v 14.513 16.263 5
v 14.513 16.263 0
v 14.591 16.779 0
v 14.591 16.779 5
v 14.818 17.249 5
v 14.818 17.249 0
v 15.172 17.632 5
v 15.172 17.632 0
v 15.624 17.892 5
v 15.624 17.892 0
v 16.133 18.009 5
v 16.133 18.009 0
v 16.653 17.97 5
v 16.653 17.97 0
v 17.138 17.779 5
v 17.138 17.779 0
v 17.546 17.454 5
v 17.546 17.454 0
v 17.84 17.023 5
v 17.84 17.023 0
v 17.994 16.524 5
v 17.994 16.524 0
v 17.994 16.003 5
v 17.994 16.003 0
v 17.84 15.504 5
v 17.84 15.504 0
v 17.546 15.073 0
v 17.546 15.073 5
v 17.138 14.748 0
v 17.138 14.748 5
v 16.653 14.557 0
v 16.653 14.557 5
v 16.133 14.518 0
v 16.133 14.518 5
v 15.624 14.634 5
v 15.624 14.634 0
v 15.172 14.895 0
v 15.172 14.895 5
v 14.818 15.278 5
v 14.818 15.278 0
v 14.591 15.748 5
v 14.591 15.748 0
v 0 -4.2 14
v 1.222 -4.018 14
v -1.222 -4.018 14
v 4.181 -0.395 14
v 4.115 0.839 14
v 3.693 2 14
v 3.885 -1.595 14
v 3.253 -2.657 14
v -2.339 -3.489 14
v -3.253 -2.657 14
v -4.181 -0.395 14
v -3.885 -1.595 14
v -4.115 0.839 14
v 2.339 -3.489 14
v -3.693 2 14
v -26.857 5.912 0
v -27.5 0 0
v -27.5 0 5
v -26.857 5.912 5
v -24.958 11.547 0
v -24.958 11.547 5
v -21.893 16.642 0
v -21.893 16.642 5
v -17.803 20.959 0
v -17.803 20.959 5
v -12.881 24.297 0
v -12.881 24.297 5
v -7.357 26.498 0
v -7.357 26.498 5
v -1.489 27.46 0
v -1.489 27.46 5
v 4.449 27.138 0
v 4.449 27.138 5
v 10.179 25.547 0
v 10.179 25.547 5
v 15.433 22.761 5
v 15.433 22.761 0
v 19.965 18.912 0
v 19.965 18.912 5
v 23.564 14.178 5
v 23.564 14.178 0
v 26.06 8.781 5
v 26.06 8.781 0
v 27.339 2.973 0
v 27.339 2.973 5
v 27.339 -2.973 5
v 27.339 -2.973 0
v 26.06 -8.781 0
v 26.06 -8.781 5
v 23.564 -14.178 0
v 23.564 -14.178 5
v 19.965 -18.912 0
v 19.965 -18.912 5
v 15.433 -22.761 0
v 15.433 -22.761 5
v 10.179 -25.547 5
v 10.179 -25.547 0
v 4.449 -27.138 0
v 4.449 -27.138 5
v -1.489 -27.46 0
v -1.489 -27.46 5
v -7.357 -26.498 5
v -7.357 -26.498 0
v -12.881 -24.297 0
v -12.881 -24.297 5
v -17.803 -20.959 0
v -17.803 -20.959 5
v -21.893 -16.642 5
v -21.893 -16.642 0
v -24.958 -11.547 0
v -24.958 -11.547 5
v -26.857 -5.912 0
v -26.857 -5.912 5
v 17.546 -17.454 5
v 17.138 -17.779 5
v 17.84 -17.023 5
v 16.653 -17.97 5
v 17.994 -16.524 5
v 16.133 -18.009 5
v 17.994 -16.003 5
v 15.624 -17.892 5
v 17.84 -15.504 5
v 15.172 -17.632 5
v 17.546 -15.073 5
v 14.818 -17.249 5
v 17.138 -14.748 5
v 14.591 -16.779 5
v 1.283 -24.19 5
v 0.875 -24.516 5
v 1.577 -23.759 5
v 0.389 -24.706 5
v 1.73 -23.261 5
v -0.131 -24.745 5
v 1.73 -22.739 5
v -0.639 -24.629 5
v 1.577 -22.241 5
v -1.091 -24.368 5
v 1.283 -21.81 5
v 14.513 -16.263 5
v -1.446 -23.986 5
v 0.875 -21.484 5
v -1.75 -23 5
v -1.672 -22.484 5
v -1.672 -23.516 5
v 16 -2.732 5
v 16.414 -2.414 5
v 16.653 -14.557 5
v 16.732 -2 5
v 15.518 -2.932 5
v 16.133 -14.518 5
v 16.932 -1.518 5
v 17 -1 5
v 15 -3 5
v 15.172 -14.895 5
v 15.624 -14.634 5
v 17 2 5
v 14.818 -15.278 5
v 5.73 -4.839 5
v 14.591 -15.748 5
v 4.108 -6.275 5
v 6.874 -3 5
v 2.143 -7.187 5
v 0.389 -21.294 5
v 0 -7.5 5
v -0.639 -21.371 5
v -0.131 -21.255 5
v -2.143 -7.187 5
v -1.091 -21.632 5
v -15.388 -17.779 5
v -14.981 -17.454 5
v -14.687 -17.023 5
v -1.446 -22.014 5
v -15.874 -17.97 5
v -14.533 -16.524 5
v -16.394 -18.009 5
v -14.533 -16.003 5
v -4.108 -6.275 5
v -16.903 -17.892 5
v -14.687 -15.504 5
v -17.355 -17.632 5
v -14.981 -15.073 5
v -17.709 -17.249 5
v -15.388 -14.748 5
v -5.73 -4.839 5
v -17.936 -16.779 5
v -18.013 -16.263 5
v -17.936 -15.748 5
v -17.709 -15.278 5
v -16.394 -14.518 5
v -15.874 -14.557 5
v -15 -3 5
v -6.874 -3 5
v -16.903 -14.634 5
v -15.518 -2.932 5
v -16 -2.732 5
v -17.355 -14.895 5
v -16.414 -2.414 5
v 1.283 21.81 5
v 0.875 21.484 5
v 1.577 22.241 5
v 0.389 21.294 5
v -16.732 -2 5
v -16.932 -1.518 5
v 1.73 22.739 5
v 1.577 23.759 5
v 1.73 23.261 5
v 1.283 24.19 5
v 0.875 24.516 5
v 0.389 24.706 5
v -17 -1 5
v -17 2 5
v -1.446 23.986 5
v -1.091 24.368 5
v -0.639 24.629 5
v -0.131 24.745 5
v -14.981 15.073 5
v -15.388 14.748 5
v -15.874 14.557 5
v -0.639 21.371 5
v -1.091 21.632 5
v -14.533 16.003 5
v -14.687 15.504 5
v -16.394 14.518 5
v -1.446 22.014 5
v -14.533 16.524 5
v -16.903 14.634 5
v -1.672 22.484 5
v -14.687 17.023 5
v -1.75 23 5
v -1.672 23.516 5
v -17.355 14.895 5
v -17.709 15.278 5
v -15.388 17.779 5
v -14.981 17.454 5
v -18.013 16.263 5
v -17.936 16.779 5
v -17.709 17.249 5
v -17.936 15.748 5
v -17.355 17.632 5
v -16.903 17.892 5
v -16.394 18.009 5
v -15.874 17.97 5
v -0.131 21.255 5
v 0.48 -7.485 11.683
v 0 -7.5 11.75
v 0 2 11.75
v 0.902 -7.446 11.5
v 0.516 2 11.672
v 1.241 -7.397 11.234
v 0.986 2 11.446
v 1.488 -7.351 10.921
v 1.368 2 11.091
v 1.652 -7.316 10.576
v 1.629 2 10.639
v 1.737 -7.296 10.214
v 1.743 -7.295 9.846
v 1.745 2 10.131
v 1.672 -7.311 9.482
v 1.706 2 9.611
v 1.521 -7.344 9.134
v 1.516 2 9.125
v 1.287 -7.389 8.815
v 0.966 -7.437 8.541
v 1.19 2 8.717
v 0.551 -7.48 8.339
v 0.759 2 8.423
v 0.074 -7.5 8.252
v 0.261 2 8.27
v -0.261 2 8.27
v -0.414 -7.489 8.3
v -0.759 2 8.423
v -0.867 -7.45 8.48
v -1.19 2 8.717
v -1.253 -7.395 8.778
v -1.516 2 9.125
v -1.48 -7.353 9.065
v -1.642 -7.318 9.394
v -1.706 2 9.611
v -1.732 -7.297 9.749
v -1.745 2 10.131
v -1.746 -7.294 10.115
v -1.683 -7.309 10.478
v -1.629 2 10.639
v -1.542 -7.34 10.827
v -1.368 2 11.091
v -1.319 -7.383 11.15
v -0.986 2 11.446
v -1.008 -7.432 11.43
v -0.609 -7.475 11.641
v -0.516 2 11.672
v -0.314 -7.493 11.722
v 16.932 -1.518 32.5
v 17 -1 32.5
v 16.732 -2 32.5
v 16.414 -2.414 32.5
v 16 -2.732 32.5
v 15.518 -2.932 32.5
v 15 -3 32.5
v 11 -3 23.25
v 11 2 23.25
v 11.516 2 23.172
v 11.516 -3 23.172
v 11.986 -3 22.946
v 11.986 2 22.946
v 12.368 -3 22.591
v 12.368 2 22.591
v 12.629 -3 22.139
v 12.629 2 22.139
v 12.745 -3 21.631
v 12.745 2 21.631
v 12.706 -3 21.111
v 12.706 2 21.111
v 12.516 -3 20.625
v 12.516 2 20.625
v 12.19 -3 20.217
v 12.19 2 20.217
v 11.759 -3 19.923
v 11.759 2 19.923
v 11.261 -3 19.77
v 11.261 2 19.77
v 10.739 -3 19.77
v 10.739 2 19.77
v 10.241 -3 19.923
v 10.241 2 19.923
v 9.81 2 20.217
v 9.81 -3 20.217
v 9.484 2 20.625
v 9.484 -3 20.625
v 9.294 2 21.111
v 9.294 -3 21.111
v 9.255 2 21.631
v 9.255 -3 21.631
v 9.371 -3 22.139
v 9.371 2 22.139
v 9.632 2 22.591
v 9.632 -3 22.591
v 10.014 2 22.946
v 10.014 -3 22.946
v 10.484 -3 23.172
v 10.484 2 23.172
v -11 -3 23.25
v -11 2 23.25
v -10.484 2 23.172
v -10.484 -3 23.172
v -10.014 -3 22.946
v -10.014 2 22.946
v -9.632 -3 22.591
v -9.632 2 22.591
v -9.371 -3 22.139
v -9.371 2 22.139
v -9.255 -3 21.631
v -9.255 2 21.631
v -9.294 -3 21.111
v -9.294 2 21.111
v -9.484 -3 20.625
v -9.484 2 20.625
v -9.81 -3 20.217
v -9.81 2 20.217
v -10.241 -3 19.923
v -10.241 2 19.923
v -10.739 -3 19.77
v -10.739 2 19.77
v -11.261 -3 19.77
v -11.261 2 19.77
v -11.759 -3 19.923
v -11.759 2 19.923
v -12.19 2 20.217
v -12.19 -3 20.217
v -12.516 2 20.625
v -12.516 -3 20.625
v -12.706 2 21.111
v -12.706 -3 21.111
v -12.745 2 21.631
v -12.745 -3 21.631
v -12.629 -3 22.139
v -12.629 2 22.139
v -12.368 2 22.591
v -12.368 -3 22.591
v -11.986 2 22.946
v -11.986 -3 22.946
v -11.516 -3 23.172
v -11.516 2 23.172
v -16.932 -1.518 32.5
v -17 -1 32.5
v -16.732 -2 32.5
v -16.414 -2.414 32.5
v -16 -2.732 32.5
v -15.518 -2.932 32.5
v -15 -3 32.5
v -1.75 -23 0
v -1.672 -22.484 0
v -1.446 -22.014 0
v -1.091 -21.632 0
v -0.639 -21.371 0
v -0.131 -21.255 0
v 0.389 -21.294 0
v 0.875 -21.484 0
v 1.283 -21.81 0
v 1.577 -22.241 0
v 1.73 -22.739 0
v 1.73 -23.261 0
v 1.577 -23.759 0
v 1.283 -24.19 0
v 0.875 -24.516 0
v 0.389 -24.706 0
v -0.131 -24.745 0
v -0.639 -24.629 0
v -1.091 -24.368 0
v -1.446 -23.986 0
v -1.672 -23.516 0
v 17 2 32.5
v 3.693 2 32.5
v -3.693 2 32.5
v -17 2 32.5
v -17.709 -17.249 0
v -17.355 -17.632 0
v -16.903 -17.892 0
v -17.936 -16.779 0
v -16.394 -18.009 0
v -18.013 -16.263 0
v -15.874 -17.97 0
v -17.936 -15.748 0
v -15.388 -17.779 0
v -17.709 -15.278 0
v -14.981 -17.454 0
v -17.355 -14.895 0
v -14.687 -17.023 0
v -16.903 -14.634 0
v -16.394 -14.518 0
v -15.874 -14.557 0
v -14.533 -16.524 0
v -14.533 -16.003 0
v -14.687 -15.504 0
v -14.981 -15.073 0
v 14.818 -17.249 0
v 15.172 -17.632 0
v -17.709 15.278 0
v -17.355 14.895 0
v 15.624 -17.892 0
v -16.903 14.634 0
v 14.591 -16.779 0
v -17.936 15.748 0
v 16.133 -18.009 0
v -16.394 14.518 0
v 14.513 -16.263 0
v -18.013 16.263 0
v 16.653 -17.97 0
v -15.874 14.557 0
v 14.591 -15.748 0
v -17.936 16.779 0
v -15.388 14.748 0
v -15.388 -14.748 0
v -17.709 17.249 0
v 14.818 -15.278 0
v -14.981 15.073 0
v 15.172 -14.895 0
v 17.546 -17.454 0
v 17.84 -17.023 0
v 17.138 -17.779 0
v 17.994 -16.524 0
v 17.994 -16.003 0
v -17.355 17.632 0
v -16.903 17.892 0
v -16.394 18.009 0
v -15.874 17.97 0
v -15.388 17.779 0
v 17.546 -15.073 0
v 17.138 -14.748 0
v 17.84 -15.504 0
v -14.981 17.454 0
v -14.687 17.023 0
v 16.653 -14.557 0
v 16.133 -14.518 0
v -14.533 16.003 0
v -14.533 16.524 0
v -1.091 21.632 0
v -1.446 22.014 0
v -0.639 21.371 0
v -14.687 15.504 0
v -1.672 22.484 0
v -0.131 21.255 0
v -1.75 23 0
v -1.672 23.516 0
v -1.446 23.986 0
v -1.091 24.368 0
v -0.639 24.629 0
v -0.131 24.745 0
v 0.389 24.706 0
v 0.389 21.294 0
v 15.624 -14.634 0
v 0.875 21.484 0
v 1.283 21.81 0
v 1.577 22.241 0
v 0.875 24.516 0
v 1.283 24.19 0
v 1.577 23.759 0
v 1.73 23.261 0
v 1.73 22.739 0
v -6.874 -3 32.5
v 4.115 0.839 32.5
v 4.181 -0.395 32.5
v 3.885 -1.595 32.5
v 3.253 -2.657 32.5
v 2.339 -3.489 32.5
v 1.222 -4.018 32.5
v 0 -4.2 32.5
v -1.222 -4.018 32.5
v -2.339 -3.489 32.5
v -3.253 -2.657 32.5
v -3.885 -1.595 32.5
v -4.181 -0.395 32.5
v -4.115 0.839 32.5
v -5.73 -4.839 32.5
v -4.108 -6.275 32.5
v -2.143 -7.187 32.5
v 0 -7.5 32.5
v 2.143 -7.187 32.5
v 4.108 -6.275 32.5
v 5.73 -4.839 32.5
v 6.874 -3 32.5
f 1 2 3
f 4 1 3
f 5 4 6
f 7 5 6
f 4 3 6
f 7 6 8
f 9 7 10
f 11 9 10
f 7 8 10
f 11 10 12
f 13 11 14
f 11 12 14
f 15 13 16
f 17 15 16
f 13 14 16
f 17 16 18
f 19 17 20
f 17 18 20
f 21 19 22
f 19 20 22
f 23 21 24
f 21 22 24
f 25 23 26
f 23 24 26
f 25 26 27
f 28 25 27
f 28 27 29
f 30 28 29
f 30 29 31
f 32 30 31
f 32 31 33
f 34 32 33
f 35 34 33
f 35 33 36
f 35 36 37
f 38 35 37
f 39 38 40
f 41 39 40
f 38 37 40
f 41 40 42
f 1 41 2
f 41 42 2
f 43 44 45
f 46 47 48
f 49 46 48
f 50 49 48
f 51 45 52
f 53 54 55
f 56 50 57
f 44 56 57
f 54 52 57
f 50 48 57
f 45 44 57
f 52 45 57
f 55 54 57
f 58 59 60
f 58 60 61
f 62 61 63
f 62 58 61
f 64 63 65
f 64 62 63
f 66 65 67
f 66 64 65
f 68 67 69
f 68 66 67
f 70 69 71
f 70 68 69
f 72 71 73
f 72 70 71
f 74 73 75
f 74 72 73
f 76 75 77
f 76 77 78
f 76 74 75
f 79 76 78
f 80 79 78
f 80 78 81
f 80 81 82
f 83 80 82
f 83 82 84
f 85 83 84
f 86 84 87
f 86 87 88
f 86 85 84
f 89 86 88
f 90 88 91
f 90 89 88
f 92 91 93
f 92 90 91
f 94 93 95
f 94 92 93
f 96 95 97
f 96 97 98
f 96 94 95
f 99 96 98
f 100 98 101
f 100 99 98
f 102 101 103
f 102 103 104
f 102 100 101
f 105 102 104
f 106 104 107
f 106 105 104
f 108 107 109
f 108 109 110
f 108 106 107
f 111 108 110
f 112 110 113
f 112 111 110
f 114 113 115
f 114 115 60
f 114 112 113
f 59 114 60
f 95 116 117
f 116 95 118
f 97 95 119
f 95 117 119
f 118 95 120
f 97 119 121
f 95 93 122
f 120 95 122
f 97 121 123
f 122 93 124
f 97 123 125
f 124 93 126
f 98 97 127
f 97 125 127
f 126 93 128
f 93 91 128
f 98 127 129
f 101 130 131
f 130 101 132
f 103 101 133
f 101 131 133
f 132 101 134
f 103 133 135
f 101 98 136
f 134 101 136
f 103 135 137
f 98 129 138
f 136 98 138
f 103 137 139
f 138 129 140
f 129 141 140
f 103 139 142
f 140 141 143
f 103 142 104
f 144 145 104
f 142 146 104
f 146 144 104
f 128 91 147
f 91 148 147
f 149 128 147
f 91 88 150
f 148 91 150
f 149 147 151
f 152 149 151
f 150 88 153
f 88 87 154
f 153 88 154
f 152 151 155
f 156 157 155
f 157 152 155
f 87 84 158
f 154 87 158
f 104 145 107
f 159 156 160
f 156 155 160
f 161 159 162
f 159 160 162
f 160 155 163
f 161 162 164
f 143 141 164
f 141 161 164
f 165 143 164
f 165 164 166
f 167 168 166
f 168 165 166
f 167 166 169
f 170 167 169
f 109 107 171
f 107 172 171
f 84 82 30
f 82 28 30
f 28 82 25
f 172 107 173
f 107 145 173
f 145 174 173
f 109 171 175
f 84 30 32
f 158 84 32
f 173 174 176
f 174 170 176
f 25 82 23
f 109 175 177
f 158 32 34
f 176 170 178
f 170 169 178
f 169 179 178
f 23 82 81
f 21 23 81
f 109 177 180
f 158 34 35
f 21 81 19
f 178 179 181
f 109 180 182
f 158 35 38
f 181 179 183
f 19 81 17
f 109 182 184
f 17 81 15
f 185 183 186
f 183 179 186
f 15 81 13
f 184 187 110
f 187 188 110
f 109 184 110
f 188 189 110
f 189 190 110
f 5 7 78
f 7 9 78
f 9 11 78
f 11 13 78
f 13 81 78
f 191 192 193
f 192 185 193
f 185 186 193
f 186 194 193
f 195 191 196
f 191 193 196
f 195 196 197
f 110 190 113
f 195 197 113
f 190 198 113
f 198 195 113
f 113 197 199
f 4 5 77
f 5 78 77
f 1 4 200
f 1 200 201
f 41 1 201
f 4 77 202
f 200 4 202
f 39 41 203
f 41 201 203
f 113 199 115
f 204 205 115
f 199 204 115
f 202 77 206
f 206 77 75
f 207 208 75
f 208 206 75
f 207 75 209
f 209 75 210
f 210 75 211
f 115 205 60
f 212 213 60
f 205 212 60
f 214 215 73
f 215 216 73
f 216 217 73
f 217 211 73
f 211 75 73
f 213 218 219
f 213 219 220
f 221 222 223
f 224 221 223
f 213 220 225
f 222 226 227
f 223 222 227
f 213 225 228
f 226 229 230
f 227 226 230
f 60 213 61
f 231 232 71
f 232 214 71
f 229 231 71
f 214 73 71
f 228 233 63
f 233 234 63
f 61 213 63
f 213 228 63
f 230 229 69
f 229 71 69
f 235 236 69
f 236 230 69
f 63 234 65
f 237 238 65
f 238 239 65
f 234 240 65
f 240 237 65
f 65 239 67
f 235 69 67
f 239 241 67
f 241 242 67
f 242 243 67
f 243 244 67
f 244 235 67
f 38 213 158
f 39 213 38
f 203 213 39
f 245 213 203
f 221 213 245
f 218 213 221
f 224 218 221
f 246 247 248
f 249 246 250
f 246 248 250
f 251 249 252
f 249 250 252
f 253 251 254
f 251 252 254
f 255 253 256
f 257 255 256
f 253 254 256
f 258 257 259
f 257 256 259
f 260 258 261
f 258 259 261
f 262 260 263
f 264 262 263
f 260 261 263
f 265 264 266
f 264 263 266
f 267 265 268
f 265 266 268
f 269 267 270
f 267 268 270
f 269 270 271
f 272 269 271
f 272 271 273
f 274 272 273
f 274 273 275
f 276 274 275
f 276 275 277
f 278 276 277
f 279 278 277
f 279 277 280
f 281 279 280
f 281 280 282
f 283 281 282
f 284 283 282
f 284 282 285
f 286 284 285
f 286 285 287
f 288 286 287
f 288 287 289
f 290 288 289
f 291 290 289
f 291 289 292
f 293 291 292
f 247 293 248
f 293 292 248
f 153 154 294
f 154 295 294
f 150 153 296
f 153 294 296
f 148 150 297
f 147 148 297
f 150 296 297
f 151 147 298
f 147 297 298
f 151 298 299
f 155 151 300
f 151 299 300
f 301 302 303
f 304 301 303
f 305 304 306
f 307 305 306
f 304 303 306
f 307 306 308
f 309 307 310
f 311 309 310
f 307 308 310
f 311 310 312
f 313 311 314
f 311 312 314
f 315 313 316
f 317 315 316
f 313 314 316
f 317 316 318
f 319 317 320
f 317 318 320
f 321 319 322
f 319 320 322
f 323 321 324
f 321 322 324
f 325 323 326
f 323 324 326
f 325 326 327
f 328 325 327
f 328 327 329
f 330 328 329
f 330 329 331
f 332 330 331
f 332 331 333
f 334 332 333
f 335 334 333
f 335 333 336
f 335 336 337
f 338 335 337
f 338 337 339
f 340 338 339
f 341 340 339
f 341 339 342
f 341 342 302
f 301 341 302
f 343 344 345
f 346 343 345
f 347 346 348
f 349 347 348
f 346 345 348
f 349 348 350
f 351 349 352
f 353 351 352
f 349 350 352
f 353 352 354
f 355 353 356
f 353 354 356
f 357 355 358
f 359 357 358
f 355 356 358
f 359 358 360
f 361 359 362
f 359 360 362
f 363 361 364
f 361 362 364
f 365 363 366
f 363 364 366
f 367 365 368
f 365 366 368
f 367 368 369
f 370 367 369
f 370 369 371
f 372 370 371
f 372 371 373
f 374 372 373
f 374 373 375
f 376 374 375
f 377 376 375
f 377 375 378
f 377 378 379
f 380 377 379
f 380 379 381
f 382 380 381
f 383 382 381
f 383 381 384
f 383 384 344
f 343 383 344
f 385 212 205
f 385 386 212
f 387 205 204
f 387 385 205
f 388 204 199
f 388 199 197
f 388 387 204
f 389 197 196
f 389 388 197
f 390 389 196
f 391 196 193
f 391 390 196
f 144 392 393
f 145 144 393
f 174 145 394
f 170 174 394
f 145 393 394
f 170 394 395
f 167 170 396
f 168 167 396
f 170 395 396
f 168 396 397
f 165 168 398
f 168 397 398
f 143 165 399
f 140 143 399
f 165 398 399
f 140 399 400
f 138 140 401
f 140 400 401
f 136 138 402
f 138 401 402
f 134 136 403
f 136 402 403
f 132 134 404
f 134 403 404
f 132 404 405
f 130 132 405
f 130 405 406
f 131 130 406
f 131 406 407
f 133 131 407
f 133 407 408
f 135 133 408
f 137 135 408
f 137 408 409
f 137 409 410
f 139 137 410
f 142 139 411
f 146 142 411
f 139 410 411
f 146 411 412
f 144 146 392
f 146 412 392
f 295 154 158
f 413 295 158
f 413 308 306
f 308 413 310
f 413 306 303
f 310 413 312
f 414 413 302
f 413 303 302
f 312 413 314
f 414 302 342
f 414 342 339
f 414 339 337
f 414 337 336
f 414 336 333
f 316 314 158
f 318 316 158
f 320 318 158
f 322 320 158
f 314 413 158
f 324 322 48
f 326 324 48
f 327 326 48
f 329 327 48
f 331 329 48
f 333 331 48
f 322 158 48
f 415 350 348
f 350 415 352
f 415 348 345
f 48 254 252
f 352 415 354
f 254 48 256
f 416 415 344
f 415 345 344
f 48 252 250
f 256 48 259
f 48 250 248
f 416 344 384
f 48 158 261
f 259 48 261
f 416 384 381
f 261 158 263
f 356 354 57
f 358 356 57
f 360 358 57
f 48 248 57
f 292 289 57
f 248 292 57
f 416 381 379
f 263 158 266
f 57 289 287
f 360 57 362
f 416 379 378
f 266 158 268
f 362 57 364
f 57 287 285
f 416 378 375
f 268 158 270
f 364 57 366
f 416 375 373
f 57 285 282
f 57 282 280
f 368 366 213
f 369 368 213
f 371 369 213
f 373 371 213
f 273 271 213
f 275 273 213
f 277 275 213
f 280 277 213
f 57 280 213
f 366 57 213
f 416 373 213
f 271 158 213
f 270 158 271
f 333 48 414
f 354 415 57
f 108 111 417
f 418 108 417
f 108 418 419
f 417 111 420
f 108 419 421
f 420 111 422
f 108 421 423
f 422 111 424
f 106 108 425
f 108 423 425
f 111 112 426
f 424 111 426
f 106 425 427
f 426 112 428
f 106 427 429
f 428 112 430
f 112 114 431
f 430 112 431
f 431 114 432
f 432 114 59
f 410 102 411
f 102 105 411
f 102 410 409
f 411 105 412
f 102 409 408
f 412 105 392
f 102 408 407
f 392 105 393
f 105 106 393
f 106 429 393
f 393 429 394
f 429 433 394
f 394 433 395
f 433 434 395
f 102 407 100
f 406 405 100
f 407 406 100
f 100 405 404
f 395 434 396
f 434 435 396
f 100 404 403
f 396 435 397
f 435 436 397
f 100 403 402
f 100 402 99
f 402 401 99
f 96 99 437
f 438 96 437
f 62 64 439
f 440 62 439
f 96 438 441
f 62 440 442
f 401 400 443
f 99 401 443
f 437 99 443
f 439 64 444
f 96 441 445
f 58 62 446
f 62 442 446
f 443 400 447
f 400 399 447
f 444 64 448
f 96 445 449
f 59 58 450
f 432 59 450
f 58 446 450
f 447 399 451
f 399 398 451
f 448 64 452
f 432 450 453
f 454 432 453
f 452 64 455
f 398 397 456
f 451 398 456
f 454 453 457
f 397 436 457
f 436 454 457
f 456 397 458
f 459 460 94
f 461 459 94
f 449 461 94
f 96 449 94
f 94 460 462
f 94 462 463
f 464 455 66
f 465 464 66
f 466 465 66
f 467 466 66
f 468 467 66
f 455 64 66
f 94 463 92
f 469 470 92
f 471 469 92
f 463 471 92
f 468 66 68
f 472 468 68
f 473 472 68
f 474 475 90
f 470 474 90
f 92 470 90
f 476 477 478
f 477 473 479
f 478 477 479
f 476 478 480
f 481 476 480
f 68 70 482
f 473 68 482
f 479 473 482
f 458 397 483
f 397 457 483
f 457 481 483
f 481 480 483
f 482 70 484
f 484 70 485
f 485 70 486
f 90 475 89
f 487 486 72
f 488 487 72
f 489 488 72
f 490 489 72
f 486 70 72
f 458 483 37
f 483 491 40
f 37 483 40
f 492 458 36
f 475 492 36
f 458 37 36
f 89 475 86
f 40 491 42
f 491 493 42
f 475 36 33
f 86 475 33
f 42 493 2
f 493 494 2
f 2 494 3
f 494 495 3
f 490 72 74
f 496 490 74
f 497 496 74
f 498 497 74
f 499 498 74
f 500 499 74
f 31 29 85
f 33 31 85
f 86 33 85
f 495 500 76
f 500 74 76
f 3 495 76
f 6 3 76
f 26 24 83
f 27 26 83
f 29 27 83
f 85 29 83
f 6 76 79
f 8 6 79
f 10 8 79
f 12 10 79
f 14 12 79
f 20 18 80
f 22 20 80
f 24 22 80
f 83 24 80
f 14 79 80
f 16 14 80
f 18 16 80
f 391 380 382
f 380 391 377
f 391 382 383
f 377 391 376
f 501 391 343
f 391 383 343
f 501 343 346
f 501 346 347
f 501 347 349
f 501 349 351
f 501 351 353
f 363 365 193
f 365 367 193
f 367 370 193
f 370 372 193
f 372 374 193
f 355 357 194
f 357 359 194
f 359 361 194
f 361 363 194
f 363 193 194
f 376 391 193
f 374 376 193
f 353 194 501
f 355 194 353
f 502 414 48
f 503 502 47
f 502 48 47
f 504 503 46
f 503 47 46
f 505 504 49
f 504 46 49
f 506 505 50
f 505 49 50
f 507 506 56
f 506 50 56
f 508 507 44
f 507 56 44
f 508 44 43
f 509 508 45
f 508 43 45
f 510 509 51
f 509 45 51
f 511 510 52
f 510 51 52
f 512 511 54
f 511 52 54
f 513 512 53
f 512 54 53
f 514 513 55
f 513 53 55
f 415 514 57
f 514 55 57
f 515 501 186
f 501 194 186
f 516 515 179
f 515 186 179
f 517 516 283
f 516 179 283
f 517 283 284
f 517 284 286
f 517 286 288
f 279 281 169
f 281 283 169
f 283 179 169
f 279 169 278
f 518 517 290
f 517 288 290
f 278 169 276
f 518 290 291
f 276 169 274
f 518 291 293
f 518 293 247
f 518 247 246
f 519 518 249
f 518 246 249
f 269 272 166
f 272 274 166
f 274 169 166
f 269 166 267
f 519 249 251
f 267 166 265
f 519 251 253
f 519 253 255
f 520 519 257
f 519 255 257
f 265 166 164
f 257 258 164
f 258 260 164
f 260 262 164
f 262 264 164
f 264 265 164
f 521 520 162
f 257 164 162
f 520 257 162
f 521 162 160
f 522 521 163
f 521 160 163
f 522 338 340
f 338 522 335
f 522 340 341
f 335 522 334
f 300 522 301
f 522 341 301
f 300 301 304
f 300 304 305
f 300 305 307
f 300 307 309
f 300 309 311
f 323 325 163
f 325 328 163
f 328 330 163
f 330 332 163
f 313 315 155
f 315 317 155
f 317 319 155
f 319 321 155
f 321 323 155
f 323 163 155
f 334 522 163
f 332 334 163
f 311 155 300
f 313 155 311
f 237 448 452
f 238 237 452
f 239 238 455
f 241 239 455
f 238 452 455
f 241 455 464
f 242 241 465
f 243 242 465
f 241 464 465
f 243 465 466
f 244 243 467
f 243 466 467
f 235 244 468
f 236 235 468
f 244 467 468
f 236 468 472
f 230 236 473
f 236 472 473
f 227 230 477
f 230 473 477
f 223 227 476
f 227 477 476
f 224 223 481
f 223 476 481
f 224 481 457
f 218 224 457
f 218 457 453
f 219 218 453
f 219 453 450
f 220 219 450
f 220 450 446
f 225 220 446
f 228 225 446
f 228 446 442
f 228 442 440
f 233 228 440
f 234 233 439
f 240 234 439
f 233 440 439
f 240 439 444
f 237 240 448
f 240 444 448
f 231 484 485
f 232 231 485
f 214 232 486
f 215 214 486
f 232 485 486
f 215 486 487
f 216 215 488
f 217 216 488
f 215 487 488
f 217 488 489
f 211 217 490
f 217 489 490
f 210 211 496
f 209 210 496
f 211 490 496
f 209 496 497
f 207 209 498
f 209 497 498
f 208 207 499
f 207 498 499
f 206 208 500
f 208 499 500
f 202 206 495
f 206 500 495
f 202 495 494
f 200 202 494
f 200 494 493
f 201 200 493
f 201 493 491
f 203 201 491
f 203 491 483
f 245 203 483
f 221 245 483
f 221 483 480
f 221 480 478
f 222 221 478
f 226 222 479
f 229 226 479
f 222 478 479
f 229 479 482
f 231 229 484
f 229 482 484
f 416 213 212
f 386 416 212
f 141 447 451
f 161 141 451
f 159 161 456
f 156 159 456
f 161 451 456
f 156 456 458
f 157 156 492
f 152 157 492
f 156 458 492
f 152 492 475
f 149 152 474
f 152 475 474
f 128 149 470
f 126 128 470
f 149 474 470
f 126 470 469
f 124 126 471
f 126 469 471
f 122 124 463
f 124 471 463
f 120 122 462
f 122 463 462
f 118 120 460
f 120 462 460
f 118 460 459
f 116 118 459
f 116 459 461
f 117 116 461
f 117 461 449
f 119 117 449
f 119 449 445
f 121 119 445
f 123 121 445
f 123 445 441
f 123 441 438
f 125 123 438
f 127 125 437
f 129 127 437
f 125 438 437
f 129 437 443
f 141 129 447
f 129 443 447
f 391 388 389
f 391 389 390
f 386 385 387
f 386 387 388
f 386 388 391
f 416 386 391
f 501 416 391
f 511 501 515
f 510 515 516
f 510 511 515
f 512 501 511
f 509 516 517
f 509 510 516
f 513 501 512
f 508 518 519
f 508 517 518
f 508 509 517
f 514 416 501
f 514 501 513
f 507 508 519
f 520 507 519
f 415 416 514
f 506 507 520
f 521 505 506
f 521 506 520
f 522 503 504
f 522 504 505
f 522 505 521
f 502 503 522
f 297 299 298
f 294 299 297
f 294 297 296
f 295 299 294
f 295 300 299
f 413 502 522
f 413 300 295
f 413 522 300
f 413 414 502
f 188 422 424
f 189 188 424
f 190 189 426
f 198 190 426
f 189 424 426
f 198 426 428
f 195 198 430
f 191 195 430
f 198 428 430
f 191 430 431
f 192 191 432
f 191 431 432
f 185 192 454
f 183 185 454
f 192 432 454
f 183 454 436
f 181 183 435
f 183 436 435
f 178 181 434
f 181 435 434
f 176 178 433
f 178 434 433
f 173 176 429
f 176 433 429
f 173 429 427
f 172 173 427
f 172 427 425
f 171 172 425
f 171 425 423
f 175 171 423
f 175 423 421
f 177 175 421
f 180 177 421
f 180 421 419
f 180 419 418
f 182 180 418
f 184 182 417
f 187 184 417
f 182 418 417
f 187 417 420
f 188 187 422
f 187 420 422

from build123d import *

# Parameters (mm, degrees)
SKETCH1_R           = 7.5
BOSS_EXTRUDE1_DEPTH = 32.5
SKETCH2_R           = 27.5
SKETCH2_R_2         = 7.5
SKETCH2_R_3         = 1.75
BOSS_EXTRUDE2_DEPTH = 5
SKETCH3_W           = 27
SKETCH3_H           = 6
CUT_EXTRUDE1_DEPTH  = 27.5
BOSS_EXTRUDE3_DEPTH = 5
BOSS_EXTRUDE4_DEPTH = 9
BOSS_EXTRUDE5_DEPTH = 27.5
SKETCH7_R           = 1.75
CUT_EXTRUDE2_DEPTH  = 52.795270054
FILLET1_R           = 2


with BuildPart() as part:
    # Sketch1 → Boss-Extrude1 (new body)
    with BuildSketch(Plane.XY):
        Circle(SKETCH1_R)
        with BuildLine():
            Line((-2.720294102, 3.2), (2.720294102, 3.2))
            ThreePointArc((2.720294102, 3.2), (0, -4.2), (-2.720294102, 3.2))
        make_face(mode=Mode.SUBTRACT)
    extrude(amount=BOSS_EXTRUDE1_DEPTH)

    # Sketch2 → Boss-Extrude2 (add)
    with BuildSketch(Plane(origin=(0, 0, 0), x_dir=(-1, 0, 0), z_dir=(0, 0, -1))):
        Circle(SKETCH2_R)
        Circle(SKETCH2_R_2, mode=Mode.SUBTRACT)
        with Locations((0, 23)):
            Circle(SKETCH2_R_3, mode=Mode.SUBTRACT)
        with Locations((16.263455967, 16.263455967)):
            Circle(SKETCH2_R_3, mode=Mode.SUBTRACT)
        with Locations((16.263455967, -16.263455967)):
            Circle(SKETCH2_R_3, mode=Mode.SUBTRACT)
        with Locations((0, -23)):
            Circle(SKETCH2_R_3, mode=Mode.SUBTRACT)
        with Locations((-16.263455967, -16.263455967)):
            Circle(SKETCH2_R_3, mode=Mode.SUBTRACT)
        with Locations((-16.263455967, 16.263455967)):
            Circle(SKETCH2_R_3, mode=Mode.SUBTRACT)
    extrude(amount=-BOSS_EXTRUDE2_DEPTH)

    # Sketch3 → Cut-Extrude1 (cut)
    with BuildSketch(Plane.XY.offset(32.5)):
        with Locations((-1.5, 5)):
            Rectangle(SKETCH3_W, SKETCH3_H)
    extrude(amount=-CUT_EXTRUDE1_DEPTH, mode=Mode.SUBTRACT)

    # Sketch4 → Boss-Extrude3 (add)
    with BuildSketch(Plane(origin=(0, 0, 0), x_dir=(-1, 0, 0), z_dir=(0, 0, -1))):
        with BuildLine():
            Line((-2.720294102, 3.2), (2.720294102, 3.2))
            ThreePointArc((2.720294102, 3.2), (0, -4.2), (-2.720294102, 3.2))
        make_face()
    extrude(amount=-BOSS_EXTRUDE3_DEPTH)

    # Sketch5 → Boss-Extrude4 (add)
    with BuildSketch(Plane.XY.offset(5)):
        with BuildLine():
            Line((-3.693237063, 2), (3.693237063, 2))
            ThreePointArc((3.693237063, 2), (0, -4.2), (-3.693237063, 2))
        make_face()
    extrude(amount=BOSS_EXTRUDE4_DEPTH)

    # Sketch6 → Boss-Extrude5 (add)
    with BuildSketch(Plane.XY.offset(5)):
        with BuildLine():
            Line((-7.228416147, 2), (-17, 2))
            Line((-17, 2), (-17, -3))
            Line((-17, -3), (-6.873863542, -3))
            ThreePointArc((-6.873863542, -3), (-7.481214682, -0.530496831), (-7.228416147, 2))
        make_face()
        with BuildLine():
            Line((6.873863542, -3), (17, -3))
            Line((17, -3), (17, 2))
            Line((17, 2), (7.228416147, 2))
            ThreePointArc((7.228416147, 2), (7.481214682, -0.530496831), (6.873863542, -3))
        make_face()
    extrude(amount=BOSS_EXTRUDE5_DEPTH)

    # Sketch7 → Cut-Extrude2 (cut, through all)
    with BuildSketch(Plane(origin=(0, 2, 0), x_dir=(1, 0, 0), z_dir=(0, 1, 0))):
        with Locations(Location((0, -10, 0), (0, 0, 270))):
            Circle(SKETCH7_R)
        with Locations(Location((-11, -21.5, 0), (0, 0, 270))):
            Circle(SKETCH7_R)
        with Locations(Location((11, -21.5, 0), (0, 0, 270))):
            Circle(SKETCH7_R)
    extrude(amount=-CUT_EXTRUDE2_DEPTH, mode=Mode.SUBTRACT)

    # Fillet1
    fillet1_edges = [part.edges().sort_by_distance(p)[0] for p in [
        (-17, -3, 18.75),
        (17, -3, 18.75),
    ]]
    fillet(fillet1_edges, radius=FILLET1_R)


solid = part.part
